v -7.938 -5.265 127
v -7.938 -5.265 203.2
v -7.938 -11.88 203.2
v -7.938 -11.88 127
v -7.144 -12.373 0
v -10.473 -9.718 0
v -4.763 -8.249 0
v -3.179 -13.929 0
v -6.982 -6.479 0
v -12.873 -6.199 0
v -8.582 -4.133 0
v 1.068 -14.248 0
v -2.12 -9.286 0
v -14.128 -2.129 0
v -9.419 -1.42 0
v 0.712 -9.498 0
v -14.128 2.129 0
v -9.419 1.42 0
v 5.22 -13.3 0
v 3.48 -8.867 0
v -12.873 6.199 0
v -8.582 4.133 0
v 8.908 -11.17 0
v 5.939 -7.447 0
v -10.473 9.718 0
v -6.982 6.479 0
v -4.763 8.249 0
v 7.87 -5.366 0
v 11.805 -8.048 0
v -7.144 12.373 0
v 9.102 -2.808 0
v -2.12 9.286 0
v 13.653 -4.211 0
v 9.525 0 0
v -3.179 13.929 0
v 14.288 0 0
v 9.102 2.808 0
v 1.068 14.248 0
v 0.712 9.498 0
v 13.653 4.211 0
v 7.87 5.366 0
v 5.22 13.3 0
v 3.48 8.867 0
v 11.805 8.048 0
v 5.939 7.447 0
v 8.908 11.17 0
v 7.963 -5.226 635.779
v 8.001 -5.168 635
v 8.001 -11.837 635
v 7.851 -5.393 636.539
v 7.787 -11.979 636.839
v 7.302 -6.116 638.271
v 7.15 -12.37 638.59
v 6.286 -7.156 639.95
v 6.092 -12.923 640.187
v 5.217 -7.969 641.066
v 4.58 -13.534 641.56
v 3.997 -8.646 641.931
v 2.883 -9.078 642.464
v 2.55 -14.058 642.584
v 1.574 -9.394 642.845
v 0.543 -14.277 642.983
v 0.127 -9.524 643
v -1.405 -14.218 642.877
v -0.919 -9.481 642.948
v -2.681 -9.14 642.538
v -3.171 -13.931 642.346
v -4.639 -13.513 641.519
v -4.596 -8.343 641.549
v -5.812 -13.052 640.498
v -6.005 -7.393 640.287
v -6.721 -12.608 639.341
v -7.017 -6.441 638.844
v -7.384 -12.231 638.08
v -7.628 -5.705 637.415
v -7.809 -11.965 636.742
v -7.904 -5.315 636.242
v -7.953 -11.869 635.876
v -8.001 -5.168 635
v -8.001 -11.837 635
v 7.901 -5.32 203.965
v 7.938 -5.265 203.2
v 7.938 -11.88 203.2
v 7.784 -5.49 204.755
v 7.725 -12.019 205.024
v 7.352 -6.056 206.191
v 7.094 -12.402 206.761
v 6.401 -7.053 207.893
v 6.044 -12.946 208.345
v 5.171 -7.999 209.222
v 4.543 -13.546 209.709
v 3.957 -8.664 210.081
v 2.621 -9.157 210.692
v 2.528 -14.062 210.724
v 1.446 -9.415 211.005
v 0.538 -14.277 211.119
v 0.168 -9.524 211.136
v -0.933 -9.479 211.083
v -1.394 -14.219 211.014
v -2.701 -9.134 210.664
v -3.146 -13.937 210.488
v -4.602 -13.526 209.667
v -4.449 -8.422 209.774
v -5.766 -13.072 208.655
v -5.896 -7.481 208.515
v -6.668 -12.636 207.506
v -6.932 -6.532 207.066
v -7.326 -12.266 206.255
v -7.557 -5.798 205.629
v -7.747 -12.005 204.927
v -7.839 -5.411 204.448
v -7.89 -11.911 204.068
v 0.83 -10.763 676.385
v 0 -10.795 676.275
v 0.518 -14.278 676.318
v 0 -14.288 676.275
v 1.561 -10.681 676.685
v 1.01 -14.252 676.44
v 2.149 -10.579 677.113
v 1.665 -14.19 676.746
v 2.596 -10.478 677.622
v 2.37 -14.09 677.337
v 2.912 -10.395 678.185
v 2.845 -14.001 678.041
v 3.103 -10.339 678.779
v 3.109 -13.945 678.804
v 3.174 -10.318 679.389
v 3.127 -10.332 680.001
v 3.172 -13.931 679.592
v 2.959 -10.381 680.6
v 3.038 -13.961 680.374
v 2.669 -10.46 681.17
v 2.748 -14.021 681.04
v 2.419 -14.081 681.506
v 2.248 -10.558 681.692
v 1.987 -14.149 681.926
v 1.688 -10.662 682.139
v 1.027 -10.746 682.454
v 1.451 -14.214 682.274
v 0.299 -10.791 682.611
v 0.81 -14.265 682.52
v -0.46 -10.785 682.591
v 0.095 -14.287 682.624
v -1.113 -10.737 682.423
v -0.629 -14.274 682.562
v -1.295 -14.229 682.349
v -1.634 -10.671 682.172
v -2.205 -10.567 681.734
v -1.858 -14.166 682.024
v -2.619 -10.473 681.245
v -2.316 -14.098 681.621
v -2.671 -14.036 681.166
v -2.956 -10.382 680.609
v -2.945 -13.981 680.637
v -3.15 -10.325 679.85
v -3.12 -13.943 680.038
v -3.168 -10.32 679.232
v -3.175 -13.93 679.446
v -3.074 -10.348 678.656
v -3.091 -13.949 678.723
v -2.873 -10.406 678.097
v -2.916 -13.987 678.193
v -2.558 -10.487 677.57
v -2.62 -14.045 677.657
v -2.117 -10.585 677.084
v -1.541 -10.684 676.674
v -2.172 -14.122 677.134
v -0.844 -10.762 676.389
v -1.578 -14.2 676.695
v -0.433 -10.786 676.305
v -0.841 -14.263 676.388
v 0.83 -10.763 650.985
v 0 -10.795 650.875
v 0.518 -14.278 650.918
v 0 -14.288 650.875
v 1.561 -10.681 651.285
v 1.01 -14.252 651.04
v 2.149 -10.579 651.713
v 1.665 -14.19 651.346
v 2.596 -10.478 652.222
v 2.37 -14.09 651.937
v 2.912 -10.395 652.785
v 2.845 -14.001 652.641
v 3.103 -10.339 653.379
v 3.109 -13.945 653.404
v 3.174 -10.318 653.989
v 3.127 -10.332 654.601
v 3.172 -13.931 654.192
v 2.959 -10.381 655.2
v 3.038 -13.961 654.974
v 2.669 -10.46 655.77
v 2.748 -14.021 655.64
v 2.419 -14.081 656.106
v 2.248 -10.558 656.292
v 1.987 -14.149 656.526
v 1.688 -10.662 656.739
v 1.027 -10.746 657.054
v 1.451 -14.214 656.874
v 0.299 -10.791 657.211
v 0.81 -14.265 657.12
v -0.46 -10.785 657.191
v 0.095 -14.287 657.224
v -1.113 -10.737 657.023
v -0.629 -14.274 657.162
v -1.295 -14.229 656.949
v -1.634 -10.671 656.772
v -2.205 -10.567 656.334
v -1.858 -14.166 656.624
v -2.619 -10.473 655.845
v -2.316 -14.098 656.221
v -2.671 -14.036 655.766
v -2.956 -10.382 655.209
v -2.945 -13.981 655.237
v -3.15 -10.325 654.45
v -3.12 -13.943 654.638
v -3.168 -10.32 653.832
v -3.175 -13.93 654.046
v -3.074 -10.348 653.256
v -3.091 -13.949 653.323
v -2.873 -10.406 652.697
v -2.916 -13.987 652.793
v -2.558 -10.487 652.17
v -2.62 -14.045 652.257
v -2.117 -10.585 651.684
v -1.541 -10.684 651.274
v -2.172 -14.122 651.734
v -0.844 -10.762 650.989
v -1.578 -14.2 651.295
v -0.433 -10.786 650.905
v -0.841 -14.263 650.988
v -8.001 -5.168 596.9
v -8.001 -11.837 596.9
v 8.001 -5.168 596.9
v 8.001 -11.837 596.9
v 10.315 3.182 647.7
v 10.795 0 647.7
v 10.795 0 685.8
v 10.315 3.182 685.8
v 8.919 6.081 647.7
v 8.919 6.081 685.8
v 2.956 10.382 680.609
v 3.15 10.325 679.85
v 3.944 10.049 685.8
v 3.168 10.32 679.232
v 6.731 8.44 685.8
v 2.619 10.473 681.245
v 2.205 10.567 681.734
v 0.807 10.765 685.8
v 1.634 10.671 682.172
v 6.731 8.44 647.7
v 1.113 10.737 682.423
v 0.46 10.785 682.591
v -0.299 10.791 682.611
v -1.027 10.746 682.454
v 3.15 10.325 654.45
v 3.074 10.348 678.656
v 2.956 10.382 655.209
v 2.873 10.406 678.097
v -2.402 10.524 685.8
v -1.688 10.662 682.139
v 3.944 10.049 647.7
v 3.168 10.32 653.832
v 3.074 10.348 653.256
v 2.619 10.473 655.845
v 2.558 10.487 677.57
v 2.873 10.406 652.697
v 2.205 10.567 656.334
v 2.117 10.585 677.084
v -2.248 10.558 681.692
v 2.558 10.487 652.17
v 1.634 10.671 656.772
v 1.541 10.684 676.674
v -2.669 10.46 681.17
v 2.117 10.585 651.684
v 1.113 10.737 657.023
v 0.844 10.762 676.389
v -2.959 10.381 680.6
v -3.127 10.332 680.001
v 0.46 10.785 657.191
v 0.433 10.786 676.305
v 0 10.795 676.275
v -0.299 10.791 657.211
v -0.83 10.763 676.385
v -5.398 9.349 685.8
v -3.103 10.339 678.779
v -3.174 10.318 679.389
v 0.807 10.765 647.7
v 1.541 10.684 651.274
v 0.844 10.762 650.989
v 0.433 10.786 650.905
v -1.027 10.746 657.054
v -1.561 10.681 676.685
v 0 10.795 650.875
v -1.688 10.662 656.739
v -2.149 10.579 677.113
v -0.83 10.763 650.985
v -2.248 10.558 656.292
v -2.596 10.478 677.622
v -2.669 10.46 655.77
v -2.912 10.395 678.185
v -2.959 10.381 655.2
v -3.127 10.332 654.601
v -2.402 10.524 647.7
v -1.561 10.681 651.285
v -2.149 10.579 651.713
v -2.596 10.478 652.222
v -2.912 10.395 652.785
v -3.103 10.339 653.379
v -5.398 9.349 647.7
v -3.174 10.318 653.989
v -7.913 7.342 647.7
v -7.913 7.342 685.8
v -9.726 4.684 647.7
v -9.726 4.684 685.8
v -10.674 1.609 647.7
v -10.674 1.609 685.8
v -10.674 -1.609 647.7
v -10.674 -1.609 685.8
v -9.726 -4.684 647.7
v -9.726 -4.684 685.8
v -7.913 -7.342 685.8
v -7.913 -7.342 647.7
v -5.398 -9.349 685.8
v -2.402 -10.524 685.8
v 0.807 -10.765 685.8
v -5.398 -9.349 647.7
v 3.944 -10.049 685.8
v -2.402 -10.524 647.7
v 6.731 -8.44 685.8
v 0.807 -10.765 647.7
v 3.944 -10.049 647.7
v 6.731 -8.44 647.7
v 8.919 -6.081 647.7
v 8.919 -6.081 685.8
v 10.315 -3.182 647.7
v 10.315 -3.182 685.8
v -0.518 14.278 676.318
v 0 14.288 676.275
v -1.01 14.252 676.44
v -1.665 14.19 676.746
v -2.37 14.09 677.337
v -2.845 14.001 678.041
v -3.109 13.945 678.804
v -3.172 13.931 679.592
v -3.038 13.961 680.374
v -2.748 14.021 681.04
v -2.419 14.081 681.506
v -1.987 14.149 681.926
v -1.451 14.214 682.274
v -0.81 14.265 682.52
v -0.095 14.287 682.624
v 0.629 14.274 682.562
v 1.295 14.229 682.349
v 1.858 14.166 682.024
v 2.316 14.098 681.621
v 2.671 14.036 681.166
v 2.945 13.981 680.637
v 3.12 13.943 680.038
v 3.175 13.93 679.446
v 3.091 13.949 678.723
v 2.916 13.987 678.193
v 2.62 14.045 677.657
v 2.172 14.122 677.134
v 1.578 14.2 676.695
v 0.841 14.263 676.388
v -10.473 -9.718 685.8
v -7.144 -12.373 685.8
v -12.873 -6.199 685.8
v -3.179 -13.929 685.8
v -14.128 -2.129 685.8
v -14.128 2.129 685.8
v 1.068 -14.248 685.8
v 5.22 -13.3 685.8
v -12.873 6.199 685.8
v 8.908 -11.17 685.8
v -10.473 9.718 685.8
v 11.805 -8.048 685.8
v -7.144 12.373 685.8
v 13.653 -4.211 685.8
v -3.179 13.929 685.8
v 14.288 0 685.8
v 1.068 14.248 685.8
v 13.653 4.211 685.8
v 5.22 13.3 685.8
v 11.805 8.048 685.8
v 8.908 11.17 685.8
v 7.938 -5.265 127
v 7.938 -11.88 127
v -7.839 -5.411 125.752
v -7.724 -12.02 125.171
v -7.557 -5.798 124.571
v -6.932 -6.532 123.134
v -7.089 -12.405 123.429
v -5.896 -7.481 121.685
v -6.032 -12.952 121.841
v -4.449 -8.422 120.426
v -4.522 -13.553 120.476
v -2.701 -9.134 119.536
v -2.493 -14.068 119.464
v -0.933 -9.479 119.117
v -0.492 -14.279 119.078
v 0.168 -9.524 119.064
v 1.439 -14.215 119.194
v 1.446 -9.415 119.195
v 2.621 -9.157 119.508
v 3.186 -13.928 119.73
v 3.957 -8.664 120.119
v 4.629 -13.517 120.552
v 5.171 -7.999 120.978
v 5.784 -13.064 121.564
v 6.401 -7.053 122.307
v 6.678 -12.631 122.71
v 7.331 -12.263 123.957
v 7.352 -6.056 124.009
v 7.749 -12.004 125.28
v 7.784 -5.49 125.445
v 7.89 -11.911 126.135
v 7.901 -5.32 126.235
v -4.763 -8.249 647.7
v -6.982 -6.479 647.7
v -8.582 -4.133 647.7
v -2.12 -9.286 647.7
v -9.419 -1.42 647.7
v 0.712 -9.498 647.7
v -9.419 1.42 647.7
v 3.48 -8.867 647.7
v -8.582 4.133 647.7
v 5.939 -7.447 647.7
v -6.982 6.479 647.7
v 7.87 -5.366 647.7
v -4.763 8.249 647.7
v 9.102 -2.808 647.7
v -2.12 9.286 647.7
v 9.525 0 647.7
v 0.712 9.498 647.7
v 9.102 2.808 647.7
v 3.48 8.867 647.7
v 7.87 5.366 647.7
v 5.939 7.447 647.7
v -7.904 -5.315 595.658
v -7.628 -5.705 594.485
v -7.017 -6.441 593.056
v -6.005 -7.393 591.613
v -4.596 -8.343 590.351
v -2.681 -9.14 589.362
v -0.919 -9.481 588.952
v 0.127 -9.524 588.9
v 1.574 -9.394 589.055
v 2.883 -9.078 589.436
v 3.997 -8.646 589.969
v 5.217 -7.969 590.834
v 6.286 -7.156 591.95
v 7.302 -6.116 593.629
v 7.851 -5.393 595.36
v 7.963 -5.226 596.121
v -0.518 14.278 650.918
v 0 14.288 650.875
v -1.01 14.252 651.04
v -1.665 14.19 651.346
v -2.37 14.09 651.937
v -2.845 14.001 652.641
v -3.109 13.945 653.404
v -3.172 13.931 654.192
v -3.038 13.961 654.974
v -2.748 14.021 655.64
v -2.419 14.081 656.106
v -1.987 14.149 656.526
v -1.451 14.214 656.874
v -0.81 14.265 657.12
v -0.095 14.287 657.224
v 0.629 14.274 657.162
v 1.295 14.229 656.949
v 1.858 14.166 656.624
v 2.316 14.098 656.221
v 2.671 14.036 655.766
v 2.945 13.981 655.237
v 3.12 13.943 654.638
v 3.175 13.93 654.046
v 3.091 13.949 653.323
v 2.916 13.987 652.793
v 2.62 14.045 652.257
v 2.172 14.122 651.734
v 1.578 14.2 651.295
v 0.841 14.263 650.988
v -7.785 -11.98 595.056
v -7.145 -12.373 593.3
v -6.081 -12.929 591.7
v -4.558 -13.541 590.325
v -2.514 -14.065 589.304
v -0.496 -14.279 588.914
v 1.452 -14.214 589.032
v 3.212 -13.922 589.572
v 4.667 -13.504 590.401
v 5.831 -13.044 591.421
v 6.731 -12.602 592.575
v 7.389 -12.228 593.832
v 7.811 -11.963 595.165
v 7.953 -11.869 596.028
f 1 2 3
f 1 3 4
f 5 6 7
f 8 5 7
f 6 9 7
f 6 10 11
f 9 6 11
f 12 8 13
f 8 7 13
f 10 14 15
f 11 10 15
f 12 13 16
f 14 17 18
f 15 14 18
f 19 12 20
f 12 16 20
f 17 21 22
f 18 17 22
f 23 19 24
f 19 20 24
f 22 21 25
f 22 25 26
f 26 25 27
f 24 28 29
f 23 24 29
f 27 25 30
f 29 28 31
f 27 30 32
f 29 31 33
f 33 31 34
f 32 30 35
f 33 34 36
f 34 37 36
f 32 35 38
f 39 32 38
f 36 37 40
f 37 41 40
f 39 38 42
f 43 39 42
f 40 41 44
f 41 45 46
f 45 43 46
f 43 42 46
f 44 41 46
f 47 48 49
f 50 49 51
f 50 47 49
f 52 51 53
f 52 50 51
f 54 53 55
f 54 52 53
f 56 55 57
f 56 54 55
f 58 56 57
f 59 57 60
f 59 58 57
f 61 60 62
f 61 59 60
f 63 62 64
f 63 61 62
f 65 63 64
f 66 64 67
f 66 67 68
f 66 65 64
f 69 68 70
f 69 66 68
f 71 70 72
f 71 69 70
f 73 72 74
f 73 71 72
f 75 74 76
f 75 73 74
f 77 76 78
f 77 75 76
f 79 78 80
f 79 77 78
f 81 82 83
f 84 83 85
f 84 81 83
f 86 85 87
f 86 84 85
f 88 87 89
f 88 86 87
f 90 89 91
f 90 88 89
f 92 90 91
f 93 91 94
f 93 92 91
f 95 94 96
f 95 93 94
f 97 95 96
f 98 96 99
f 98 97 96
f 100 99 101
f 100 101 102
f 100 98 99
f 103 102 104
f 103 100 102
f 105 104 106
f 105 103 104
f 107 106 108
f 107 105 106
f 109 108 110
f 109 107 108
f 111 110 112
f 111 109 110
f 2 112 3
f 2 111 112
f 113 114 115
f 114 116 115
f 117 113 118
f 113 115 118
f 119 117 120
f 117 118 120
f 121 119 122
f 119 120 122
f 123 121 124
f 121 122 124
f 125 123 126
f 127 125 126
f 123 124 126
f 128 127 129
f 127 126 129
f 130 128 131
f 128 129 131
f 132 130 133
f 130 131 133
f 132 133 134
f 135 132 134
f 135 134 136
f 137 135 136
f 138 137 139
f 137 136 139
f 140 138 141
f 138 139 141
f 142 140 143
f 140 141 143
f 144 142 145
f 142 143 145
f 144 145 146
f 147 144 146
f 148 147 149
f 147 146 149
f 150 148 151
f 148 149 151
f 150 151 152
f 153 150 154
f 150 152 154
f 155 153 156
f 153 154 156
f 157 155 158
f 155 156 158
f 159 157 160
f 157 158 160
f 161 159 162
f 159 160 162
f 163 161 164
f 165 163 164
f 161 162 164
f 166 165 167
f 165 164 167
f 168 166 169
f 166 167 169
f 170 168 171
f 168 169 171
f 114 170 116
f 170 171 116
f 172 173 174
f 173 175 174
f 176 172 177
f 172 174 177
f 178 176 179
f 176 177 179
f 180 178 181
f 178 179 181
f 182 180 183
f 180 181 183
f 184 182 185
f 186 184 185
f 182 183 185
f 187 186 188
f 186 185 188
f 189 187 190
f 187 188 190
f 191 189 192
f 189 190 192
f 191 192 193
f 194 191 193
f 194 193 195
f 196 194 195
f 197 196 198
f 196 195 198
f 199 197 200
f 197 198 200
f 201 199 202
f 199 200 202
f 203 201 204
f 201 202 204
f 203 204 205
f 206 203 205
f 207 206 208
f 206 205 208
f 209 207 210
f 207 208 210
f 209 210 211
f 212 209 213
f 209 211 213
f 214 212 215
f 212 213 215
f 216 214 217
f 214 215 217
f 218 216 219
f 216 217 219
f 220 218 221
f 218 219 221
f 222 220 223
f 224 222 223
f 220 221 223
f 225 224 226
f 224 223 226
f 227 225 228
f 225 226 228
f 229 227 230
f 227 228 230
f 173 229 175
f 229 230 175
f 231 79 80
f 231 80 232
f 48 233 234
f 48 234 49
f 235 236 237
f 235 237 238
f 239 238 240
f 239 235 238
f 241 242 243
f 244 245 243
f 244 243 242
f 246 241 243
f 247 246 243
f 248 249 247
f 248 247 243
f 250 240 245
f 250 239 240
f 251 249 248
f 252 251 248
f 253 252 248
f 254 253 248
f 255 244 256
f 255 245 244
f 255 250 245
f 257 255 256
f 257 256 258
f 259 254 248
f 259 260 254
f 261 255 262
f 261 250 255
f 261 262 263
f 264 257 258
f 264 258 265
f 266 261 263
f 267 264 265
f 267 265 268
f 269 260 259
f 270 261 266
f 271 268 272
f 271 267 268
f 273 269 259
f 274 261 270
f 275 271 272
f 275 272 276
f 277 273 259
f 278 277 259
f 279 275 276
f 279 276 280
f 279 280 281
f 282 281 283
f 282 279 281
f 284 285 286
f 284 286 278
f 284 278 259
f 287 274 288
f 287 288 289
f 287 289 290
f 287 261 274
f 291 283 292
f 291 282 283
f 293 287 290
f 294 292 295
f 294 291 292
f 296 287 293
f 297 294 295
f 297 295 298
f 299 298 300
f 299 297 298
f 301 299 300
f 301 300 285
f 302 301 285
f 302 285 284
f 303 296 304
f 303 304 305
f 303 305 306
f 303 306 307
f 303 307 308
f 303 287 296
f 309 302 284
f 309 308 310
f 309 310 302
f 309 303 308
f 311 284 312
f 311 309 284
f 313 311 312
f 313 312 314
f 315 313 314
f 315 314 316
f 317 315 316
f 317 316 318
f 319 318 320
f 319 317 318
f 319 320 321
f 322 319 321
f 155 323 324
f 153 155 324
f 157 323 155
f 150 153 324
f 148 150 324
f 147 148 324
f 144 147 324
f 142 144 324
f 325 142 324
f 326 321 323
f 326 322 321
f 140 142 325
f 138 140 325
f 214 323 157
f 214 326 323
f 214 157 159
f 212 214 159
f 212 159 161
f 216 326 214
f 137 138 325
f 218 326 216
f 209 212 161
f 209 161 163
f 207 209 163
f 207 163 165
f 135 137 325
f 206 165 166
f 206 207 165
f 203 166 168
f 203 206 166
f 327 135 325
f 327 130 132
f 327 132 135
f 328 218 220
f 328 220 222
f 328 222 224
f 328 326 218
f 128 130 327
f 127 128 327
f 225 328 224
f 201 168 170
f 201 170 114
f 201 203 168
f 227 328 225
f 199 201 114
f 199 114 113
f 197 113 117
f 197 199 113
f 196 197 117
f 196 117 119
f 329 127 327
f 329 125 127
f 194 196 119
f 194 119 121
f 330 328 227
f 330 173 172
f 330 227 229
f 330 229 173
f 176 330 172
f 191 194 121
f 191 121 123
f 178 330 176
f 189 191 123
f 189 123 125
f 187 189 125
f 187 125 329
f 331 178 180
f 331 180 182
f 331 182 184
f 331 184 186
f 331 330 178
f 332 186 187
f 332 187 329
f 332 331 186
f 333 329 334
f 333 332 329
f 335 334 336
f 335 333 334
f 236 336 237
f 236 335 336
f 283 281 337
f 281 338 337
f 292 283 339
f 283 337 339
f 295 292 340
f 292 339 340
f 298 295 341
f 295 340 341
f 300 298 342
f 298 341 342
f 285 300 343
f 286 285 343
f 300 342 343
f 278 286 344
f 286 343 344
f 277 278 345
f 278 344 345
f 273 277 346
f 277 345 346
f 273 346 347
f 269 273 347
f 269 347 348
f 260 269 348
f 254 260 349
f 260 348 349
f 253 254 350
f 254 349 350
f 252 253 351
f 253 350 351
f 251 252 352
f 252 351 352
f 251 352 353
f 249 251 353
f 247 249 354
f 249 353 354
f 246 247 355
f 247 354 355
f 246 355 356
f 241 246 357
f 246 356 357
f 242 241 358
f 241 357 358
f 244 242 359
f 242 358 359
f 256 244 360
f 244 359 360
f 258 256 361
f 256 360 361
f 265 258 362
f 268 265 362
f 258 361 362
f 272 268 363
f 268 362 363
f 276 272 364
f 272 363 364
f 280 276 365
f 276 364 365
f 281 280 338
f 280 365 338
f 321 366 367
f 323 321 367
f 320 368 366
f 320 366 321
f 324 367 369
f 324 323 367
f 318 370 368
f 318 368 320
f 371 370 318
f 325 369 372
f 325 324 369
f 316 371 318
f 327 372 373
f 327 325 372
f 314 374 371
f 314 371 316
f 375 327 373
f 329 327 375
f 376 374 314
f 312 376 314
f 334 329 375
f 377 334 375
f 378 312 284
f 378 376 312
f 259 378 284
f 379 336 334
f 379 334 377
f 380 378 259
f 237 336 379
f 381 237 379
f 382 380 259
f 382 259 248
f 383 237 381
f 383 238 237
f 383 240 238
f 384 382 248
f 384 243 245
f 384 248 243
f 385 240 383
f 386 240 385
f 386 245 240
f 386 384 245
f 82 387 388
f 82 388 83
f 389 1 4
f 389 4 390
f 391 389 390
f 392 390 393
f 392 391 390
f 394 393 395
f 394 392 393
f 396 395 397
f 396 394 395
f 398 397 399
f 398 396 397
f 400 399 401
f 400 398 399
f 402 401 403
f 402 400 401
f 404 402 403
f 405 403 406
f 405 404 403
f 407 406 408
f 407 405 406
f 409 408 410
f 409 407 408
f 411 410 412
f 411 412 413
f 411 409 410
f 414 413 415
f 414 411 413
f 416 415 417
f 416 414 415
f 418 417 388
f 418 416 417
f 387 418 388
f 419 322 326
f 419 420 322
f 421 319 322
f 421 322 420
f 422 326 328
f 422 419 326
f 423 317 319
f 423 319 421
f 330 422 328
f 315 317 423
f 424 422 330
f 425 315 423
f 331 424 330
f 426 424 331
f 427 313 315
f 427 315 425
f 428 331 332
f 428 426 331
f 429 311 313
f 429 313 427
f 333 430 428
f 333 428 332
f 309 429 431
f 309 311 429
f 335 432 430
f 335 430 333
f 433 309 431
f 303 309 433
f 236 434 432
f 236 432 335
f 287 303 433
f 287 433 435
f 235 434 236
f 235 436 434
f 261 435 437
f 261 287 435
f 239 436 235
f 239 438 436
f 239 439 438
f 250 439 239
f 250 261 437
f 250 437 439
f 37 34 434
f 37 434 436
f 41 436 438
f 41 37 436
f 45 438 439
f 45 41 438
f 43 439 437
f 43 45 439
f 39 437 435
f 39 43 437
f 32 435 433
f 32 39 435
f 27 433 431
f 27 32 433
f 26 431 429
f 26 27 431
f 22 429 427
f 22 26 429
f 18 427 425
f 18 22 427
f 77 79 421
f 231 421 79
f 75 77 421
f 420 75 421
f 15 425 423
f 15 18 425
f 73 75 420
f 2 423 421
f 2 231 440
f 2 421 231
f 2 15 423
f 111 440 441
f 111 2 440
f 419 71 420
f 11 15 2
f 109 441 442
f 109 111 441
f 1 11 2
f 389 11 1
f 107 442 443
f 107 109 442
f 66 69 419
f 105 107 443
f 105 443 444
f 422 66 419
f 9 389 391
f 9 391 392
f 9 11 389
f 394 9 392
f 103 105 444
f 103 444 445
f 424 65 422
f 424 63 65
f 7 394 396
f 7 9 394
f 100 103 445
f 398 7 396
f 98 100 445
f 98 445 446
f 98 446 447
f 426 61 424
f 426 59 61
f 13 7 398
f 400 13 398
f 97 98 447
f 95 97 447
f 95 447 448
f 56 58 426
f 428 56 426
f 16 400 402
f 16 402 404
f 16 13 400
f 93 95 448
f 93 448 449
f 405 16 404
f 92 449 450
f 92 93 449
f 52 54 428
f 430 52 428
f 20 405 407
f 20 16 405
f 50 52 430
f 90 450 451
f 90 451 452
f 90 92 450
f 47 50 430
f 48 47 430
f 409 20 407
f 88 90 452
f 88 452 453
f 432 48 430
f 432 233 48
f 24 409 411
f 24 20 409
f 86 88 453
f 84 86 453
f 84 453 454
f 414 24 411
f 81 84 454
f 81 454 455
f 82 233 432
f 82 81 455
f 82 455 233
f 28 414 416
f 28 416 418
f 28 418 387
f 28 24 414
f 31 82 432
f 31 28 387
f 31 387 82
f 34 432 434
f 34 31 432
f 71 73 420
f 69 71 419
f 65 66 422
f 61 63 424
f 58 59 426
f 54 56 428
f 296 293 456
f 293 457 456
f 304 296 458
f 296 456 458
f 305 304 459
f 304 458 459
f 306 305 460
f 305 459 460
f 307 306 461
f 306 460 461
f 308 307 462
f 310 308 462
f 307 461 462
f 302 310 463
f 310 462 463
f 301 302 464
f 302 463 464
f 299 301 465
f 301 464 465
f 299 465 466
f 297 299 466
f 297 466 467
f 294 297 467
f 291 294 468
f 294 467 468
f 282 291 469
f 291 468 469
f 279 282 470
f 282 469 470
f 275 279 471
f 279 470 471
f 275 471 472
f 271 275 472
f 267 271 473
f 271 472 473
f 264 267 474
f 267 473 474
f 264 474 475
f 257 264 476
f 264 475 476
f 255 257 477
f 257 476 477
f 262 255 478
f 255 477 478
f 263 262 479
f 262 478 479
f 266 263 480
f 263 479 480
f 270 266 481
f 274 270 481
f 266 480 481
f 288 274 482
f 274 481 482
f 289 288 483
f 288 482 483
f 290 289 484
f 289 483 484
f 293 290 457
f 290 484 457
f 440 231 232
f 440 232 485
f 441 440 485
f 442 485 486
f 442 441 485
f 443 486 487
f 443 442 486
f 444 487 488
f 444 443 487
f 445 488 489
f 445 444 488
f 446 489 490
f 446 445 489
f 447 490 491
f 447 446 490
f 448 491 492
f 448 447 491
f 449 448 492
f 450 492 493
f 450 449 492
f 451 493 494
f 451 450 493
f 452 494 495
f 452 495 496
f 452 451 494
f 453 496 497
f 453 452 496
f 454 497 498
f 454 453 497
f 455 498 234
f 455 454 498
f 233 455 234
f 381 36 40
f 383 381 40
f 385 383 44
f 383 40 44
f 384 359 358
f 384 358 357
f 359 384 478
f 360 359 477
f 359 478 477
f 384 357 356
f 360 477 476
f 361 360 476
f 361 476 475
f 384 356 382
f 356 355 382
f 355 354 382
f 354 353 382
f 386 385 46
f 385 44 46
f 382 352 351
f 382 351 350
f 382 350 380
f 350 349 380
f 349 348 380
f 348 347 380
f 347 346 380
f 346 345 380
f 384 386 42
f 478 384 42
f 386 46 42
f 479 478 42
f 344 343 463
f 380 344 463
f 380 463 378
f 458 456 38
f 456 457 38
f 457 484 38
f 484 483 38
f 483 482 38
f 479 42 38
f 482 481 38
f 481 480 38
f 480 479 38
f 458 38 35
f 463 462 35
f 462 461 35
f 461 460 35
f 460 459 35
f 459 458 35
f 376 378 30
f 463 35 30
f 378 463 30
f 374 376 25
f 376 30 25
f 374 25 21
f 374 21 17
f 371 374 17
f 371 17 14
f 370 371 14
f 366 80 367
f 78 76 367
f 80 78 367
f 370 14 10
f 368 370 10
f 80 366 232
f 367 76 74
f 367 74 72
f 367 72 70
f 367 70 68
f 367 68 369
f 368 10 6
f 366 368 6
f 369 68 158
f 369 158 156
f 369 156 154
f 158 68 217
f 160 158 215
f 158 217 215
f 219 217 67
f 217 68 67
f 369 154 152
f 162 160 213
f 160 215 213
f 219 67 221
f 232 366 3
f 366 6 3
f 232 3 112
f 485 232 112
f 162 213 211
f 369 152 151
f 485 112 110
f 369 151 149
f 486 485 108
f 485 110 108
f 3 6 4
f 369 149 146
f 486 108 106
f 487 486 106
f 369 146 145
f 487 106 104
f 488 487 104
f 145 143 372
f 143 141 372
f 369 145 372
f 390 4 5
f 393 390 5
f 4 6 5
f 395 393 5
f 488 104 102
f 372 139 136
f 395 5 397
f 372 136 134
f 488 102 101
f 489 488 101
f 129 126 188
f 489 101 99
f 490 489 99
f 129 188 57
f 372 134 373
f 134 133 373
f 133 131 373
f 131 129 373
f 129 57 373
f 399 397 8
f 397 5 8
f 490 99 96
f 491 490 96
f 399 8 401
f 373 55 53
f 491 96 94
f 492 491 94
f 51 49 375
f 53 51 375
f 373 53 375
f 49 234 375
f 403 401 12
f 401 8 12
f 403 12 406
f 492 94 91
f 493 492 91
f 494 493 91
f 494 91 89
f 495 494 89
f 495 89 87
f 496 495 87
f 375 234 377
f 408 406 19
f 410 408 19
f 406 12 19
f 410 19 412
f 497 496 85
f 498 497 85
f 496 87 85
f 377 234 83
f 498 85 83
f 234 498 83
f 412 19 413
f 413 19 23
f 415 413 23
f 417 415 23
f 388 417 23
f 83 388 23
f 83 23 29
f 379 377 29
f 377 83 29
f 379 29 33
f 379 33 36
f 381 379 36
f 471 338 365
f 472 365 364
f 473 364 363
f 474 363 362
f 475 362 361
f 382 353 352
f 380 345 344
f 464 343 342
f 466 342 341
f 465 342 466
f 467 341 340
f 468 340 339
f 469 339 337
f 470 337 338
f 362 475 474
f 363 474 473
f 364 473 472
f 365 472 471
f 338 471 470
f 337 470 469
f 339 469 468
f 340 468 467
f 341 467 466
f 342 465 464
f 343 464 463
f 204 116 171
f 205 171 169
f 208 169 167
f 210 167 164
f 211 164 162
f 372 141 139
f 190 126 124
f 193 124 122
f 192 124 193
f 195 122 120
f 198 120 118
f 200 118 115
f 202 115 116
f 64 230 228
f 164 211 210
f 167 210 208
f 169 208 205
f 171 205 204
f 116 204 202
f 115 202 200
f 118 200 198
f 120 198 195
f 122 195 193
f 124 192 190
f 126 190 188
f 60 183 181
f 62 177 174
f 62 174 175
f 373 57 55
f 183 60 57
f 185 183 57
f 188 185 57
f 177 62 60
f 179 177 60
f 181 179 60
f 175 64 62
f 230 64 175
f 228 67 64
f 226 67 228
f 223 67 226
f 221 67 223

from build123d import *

# Parameters (mm, degrees)
SKETCH1_R                            = 14.2875
SKETCH1_R_2                          = 9.525
BOSS_EXTRUDE1_DEPTH                  = 685.8
CUT_EXTRUDE1_DEPTH                   = 687.097591682
CUT_EXTRUDE2_START                   = -38.1
SKETCH3_R                            = 10.795
SKETCH3_R_2                          = 9.525
CUT_EXTRUDE2_DEPTH                   = 38.1
CUT_EXTRUDE3_DEPTH                   = 687.097591787
SKETCH7_W                            = 3.175
SKETCH7_H                            = 14.2875
F_1_4_0_25_DIAMETER_HOLE1_AT_2_COUNT = 2
F_1_4_0_25_DIAMETER_HOLE1_AT_2_PITCH = 25.4
CIRPATTERN1_COUNT                    = 2
CIRPATTERN1_COPY_1_SKETCH_W          = 3.175
CIRPATTERN1_COPY_1_SKETCH_H          = 14.2875


with BuildPart() as part:
    # Sketch1 → Boss-Extrude1 (new body)
    with BuildSketch(Plane.XY):
        Circle(SKETCH1_R)
        Circle(SKETCH1_R_2, mode=Mode.SUBTRACT)
    extrude(amount=BOSS_EXTRUDE1_DEPTH)

    # Sketch2 → Cut-Extrude1 (cut, through all)
    with BuildSketch(Plane(origin=(0, 0, 0), x_dir=(1, 0, 0), z_dir=(0, 1, 0))):
        with BuildLine():
            Line((7.9375, -127), (7.9375, -203.2))
            ThreePointArc((7.9375, -203.2), (0, -211.1375), (-7.9375, -203.2))
            Line((-7.9375, -203.2), (-7.9375, -127))
            ThreePointArc((-7.9375, -127), (0, -119.0625), (7.9375, -127))
        make_face()
    extrude(amount=-CUT_EXTRUDE1_DEPTH, mode=Mode.SUBTRACT)

    # Sketch3 → Cut-Extrude2 (cut)
    with BuildSketch(Plane.XY.offset(685.8).offset(CUT_EXTRUDE2_START)):
        Circle(SKETCH3_R)
        Circle(SKETCH3_R_2, mode=Mode.SUBTRACT)
    extrude(amount=CUT_EXTRUDE2_DEPTH, mode=Mode.SUBTRACT)

    # Sketch4 → Cut-Extrude3 (cut, through all)
    with BuildSketch(Plane(origin=(0, 0, 0), x_dir=(1, 0, 0), z_dir=(0, 1, 0))):
        with BuildLine():
            Line((-8.001, -635), (-8.001, -596.9))
            ThreePointArc((-8.001, -596.9), (0, -588.899), (8.001, -596.9))
            Line((8.001, -596.9), (8.001, -635))
            ThreePointArc((8.001, -635), (0, -643.001), (-8.001, -635))
        make_face()
    extrude(amount=-CUT_EXTRUDE3_DEPTH, mode=Mode.SUBTRACT)

    # Sketch7 → 1/4 (0.25) Diameter Hole1 (revolve, cut)
    with BuildSketch(Plane(origin=(0, 0, 654.05), x_dir=(0, 0, -1), z_dir=(1, 0, 0))):
        with Locations((1.5875, 7.14375)):
            Rectangle(SKETCH7_W, SKETCH7_H)
    f_1_4_0_25_diameter_hole1 = revolve(axis=Axis((0, -6.35, 654.05), (0, 1, 0)), mode=Mode.SUBTRACT)

    # 1/4 (0.25) Diameter Hole1 at 2: 1/4 (0.25) Diameter Hole1 ×2
    with Locations(*[(0, 0, i * F_1_4_0_25_DIAMETER_HOLE1_AT_2_PITCH) for i in range(1, F_1_4_0_25_DIAMETER_HOLE1_AT_2_COUNT)]):
        add(f_1_4_0_25_diameter_hole1, mode=Mode.SUBTRACT)

    # CirPattern1: 1/4 (0.25) Diameter Hole1 ×2 about axis
    cirpattern1_axis = Axis((0, 0, 647.7), (0, 0, 1))
    for i in range(1, CIRPATTERN1_COUNT):
        add(f_1_4_0_25_diameter_hole1.rotate(cirpattern1_axis, i * 360 / CIRPATTERN1_COUNT), mode=Mode.SUBTRACT)

    # CirPattern1 copy 1 sketch → CirPattern1 copy 1 (revolve, cut)
    with BuildSketch(Plane(origin=(0, 0, 679.45), x_dir=(0, 0, -1), z_dir=(-1, 0, 0))):
        with Locations((1.5875, 7.14375)):
            Rectangle(CIRPATTERN1_COPY_1_SKETCH_W, CIRPATTERN1_COPY_1_SKETCH_H)
    revolve(axis=Axis((0, 6.35, 679.45), (0, -1, 0)), mode=Mode.SUBTRACT)


solid = part.part
